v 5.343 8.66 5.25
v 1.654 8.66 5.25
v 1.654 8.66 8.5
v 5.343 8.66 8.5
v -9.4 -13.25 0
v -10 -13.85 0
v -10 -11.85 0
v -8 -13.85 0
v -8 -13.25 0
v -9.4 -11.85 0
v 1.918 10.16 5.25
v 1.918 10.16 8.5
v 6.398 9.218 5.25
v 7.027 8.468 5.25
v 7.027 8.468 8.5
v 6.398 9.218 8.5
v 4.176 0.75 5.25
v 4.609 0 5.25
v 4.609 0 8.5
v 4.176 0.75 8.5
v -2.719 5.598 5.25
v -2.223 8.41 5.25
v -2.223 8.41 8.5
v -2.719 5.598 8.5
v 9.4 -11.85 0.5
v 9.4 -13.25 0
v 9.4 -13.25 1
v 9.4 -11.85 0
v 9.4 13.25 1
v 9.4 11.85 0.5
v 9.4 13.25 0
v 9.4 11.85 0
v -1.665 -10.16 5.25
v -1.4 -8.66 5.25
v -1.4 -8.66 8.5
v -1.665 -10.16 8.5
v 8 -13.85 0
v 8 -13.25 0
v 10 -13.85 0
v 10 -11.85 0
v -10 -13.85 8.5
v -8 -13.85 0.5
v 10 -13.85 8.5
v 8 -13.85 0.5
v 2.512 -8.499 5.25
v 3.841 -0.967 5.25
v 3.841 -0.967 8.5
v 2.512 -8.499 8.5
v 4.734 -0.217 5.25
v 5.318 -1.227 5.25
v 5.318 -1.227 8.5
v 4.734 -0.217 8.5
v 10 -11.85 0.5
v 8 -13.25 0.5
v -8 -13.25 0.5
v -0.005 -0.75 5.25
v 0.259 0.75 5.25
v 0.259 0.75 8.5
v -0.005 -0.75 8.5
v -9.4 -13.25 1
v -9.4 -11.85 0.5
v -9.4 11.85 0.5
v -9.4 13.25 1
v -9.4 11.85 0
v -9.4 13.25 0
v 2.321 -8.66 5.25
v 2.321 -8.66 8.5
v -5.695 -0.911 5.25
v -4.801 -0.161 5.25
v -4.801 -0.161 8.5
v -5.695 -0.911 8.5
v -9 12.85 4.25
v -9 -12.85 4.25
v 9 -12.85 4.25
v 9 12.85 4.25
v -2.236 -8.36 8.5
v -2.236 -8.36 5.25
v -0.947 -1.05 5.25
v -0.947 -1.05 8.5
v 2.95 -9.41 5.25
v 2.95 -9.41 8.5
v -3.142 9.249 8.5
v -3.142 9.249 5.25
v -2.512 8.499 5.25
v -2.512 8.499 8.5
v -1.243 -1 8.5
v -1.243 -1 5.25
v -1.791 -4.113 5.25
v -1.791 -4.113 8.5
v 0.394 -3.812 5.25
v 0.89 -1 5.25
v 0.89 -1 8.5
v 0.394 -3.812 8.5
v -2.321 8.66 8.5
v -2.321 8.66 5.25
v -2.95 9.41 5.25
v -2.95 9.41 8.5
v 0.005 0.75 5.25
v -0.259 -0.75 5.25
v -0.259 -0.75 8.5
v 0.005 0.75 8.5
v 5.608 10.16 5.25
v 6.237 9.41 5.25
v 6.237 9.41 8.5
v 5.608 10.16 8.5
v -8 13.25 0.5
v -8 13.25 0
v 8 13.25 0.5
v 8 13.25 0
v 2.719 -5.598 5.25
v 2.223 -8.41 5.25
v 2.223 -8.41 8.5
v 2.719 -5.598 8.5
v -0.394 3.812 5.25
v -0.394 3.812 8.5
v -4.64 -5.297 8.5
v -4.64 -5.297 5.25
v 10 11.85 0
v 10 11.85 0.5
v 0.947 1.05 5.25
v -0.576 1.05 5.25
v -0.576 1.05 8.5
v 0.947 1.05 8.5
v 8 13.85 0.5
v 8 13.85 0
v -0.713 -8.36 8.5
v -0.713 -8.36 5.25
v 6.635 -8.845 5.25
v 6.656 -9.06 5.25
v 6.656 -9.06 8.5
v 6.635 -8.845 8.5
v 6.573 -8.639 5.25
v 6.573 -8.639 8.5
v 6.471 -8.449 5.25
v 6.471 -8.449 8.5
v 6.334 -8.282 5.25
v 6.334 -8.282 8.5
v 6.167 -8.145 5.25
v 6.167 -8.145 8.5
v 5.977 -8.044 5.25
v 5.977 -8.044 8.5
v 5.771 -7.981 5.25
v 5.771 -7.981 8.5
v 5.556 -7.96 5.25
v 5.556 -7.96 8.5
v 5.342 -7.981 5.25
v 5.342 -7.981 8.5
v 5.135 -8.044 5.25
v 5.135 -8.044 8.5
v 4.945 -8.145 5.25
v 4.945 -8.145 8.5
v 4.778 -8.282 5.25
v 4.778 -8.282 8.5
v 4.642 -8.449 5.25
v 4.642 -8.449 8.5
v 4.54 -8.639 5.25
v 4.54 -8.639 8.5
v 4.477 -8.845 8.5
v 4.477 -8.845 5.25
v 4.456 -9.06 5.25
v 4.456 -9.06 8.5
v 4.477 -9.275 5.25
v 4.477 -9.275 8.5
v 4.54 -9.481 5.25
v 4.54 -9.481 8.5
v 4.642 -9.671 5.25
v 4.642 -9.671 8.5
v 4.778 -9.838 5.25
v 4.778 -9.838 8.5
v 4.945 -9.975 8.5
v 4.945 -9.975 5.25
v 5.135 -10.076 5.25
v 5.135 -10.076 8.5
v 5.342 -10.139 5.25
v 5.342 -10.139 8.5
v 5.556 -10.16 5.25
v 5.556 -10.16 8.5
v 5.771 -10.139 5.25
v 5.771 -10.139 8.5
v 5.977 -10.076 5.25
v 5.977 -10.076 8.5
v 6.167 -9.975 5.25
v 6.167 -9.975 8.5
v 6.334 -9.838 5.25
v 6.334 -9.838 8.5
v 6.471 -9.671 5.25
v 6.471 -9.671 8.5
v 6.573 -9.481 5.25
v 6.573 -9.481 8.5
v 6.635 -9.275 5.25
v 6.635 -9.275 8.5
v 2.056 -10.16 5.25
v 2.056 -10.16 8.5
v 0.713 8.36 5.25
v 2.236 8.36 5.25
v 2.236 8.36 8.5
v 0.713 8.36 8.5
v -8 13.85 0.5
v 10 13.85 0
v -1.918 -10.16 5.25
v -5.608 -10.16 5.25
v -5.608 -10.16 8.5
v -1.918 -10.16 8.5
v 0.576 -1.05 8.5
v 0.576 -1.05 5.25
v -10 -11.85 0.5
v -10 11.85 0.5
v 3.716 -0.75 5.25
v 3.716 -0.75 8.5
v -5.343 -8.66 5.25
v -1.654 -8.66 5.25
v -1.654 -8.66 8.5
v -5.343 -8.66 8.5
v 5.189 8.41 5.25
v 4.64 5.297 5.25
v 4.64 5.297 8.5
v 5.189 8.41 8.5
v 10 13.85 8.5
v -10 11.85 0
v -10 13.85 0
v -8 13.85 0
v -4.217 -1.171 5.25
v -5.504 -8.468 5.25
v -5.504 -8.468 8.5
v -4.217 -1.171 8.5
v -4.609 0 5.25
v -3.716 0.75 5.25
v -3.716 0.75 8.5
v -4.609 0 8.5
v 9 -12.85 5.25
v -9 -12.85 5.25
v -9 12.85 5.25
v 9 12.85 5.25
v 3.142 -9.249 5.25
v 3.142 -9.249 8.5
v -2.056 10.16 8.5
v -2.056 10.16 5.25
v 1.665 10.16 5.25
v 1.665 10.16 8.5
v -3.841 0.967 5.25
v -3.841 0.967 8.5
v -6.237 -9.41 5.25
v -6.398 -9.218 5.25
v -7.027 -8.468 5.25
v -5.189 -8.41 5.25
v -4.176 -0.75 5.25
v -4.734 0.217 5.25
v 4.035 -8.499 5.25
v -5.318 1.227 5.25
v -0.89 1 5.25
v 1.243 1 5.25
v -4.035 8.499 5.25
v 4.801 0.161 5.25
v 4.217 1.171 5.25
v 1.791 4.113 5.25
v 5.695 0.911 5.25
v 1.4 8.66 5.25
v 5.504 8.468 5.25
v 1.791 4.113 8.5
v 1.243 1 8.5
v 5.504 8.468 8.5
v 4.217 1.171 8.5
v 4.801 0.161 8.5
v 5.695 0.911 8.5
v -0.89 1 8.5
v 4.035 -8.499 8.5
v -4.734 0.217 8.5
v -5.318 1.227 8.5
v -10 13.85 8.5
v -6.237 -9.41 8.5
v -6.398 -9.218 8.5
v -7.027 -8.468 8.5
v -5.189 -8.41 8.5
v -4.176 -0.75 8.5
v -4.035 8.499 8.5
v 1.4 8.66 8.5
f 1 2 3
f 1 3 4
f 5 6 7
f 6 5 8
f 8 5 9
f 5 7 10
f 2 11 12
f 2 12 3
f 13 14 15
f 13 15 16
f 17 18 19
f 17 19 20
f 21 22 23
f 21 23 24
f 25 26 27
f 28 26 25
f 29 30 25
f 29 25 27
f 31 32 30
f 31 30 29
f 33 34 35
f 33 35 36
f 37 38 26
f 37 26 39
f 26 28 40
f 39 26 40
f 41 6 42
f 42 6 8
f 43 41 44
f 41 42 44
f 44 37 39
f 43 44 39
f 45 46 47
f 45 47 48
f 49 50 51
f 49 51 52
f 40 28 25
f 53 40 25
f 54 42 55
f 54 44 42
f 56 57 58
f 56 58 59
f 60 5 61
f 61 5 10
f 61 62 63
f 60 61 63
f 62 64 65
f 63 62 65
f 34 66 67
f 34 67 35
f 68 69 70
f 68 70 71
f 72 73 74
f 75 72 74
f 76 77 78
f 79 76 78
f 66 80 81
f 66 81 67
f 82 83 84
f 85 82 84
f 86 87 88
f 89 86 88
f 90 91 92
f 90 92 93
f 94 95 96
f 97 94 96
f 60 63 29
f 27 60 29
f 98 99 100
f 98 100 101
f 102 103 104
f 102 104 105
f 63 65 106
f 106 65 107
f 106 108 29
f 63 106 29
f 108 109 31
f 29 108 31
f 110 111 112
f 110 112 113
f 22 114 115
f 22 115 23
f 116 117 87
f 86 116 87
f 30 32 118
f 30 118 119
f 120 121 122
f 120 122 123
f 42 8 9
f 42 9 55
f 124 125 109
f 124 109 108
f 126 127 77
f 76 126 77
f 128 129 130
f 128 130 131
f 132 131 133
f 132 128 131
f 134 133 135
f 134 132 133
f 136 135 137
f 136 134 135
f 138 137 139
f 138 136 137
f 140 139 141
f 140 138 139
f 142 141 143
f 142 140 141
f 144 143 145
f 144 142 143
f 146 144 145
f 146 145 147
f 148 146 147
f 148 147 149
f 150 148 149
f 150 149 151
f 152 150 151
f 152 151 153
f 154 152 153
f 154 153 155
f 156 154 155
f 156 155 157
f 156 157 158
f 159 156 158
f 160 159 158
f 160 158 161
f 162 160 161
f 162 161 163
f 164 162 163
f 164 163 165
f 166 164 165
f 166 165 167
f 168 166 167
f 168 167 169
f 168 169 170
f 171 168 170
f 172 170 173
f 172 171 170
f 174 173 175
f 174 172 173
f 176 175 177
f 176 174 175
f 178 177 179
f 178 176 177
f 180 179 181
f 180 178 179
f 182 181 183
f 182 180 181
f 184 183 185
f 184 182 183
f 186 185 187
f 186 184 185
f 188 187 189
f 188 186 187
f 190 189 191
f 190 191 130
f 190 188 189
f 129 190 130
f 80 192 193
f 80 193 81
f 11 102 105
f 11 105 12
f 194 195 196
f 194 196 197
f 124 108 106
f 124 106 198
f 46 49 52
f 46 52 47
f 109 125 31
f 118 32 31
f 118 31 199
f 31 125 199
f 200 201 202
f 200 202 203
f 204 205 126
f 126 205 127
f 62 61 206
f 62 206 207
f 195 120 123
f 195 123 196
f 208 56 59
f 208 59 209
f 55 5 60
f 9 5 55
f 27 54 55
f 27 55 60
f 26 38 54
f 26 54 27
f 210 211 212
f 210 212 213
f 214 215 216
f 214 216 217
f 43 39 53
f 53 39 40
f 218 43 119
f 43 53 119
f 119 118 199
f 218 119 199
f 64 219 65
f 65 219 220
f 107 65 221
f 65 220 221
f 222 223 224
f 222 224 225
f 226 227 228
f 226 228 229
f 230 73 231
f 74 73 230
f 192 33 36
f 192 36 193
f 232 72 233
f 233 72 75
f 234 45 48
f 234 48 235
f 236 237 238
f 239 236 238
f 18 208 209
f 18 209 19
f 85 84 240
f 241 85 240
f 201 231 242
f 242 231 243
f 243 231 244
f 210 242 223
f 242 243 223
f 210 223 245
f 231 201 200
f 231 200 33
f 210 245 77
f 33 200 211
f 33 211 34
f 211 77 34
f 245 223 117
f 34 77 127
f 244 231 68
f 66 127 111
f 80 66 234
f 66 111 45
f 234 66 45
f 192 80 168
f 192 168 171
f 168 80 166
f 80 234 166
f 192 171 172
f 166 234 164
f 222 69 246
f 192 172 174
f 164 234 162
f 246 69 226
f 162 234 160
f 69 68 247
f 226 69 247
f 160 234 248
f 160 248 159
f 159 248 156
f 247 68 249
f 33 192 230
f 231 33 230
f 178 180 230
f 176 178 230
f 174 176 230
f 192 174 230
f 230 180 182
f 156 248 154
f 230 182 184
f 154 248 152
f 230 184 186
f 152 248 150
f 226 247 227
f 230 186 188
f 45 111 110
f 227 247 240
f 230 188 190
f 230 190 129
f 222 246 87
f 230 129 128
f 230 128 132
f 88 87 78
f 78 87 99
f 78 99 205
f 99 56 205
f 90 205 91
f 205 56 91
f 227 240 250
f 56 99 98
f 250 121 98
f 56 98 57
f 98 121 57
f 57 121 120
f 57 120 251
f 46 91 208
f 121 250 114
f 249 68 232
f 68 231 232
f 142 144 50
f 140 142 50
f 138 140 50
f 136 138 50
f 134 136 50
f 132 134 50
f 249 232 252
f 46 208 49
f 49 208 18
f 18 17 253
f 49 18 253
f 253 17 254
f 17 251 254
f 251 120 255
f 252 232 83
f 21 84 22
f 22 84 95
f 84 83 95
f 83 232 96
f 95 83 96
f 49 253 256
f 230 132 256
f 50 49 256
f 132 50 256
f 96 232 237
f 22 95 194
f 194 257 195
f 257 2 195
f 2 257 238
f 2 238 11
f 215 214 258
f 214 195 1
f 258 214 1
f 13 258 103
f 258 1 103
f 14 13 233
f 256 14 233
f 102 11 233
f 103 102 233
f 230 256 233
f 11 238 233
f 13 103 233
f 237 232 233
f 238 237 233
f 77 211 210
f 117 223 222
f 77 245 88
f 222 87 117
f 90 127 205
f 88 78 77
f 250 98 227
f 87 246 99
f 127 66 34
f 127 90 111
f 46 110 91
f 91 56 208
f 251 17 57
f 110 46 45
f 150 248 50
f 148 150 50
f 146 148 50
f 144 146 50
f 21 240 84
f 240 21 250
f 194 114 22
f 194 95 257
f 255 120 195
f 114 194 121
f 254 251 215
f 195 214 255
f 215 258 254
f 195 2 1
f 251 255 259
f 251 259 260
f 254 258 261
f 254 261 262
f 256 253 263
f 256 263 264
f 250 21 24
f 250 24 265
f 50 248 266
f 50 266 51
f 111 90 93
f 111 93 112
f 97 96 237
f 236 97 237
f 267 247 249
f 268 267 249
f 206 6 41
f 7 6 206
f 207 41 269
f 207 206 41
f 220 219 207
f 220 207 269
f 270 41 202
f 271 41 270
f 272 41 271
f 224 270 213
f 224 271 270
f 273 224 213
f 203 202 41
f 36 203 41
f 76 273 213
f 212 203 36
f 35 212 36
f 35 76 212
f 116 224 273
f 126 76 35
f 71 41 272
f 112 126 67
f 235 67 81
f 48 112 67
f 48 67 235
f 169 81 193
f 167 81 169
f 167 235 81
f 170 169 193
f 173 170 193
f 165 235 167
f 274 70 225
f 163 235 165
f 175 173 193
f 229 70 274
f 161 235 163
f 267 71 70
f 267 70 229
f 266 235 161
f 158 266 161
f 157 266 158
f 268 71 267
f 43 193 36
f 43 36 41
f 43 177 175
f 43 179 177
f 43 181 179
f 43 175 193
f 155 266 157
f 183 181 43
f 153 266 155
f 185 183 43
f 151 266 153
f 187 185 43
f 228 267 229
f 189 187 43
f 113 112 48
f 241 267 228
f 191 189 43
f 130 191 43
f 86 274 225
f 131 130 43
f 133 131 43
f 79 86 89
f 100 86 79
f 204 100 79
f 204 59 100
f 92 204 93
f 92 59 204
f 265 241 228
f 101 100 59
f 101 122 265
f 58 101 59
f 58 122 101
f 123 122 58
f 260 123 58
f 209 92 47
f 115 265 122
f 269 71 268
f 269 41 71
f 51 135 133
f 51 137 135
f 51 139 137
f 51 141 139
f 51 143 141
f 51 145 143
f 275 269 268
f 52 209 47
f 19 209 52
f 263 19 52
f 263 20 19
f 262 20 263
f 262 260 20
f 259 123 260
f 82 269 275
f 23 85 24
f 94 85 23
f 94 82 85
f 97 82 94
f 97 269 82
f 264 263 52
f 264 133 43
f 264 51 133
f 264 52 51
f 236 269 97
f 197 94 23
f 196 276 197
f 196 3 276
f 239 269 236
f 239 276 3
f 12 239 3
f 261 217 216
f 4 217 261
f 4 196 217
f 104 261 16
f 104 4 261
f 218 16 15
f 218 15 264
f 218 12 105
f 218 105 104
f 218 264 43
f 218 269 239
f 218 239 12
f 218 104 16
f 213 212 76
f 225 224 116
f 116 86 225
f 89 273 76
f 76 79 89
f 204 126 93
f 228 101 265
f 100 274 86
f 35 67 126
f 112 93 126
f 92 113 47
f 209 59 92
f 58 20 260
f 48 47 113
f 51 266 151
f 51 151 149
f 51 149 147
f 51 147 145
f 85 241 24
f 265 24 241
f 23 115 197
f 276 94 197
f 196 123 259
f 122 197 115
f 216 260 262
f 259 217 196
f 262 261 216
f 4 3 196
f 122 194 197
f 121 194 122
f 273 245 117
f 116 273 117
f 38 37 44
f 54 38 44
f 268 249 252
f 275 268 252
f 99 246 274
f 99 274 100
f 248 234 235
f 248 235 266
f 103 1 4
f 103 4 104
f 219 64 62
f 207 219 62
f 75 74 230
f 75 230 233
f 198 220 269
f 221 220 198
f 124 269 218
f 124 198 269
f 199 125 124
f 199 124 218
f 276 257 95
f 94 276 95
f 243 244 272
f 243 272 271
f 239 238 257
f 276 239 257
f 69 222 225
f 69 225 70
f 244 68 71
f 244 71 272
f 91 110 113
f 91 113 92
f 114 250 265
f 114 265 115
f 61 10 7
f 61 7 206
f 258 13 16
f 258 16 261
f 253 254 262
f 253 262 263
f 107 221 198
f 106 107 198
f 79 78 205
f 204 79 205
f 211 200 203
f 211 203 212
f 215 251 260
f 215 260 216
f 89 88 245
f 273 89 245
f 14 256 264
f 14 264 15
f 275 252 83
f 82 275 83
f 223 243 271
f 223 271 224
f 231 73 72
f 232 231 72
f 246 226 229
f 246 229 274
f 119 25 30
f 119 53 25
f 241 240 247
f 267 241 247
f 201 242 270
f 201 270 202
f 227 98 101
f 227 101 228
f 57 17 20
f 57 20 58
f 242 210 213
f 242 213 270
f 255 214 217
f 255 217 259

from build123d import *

# Parameters (mm, degrees)
SKETCH_W             = 18
SKETCH_H             = 25.7
PAD001_DEPTH         = 1
SKETCH002_R          = 1.1
PAD002_DEPTH         = 4.25
SKETCH004_W          = 20
SKETCH004_H          = 27.7
PAD004_DEPTH         = 8.5
SKETCH005_W          = 16
SKETCH005_H          = 0.5
POCKET_DEPTH         = 13.851
POCKET_DEPTH_BACK    = 13.851
SKETCH006_W          = 23.7
SKETCH006_H          = 0.5
POCKET001_DEPTH      = 10.001
POCKET001_DEPTH_BACK = 10.001
SKETCH007_W          = 18.8
SKETCH007_H          = 26.5
POCKET002_DEPTH      = 1


with BuildPart() as body004:
    # Sketch → Pad001 (new body)
    with BuildSketch(Plane.XY):
        Rectangle(SKETCH_W, SKETCH_H)
    extrude(amount=PAD001_DEPTH)

    # Sketch002 → Pad002 (join)
    with BuildSketch(Plane.XY):
        with Locations((5.556277, -9.06)):
            Circle(SKETCH002_R)
        Polygon((1.664554, 10.16), (1.400063, 8.66), (-2.320768, 8.66), (-2.950092, 9.41), (-2.056277, 10.16), align=None)
        Polygon((1.91841, 10.16), (1.65392, 8.66), (5.343461, 8.66), (6.237276, 9.41), (5.607952, 10.16), align=None)
        Polygon((-3.141603, 9.249303), (-2.512279, 8.499303), (-3.840514, 0.966506), (-4.734329, 0.216506), (-5.317726, 1.226979), (-4.035419, 8.499303), align=None)
        Polygon((6.397973, 9.218489), (5.504158, 8.468489), (4.217444, 1.171169), (4.80084, 0.160697), (5.694655, 0.910697), (7.027298, 8.468489), align=None)
        Polygon((-3.715514, 0.75), (-4.609329, 0), (-4.176316, -0.75), (-0.259174, -0.75), (0.005317, 0.75), align=None)
        Polygon((0.259174, 0.75), (-0.005317, -0.75), (3.715514, -0.75), (4.609329, 0), (4.176316, 0.75), align=None)
        Polygon((4.734329, -0.216506), (3.840514, -0.966506), (2.512279, -8.499303), (3.141603, -9.249303), (4.035419, -8.499303), (5.317726, -1.226979), align=None)
        Polygon((-4.217444, -1.171169), (-4.80084, -0.160697), (-5.694655, -0.910697), (-7.027298, -8.468489), (-6.397973, -9.218489), (-5.504158, -8.468489), align=None)
        Polygon((-5.343461, -8.66), (-6.237276, -9.41), (-5.607952, -10.16), (-1.91841, -10.16), (-1.65392, -8.66), align=None)
        Polygon((-1.400063, -8.66), (-1.664554, -10.16), (2.056277, -10.16), (2.950092, -9.41), (2.320768, -8.66), align=None)
        Polygon((-0.946713, -1.05), (0.576427, -1.05), (-0.712524, -8.36), (-2.235664, -8.36), align=None)
        Polygon((-0.576427, 1.05), (0.946713, 1.05), (2.235664, 8.36), (0.712524, 8.36), align=None)
        Polygon((-2.223397, 8.41), (-2.719177, 5.598295), (-0.889871, 1), (-0.394092, 3.811705), align=None)
        Polygon((1.791361, 4.112606), (1.242525, 1), (4.640381, 5.297394), (5.189217, 8.41), align=None)
        Polygon((0.889871, -1), (0.394092, -3.811705), (2.223397, -8.41), (2.719177, -5.598295), align=None)
        Polygon((-1.242525, -1), (-1.791361, -4.112606), (-5.189217, -8.41), (-4.640381, -5.297394), align=None)
    extrude(amount=PAD002_DEPTH)


with BuildPart() as body004_1:
    # Body001 placement: moved
    add(body004.part.moved(Location((0, 0, 4.25))))


with BuildPart() as pkg:
    # Sketch004 → Pad004 (new body)
    with BuildSketch(Plane.XY):
        Rectangle(SKETCH004_W, SKETCH004_H)
    extrude(amount=PAD004_DEPTH)

    # Sketch005 → Pocket (cut, two sides)
    with BuildSketch(Plane.XZ) as pocket_sk:
        with Locations((0, 0.25)):
            Rectangle(SKETCH005_W, SKETCH005_H)
    extrude(amount=-POCKET_DEPTH, mode=Mode.SUBTRACT)
    extrude(pocket_sk.sketch, amount=POCKET_DEPTH_BACK, mode=Mode.SUBTRACT)

    # Sketch006 → Pocket001 (cut, two sides)
    with BuildSketch(Plane.YZ) as pocket001_sk:
        with Locations((0, 0.25)):
            Rectangle(SKETCH006_W, SKETCH006_H)
    extrude(amount=-POCKET001_DEPTH, mode=Mode.SUBTRACT)
    extrude(pocket001_sk.sketch, amount=POCKET001_DEPTH_BACK, mode=Mode.SUBTRACT)

    # Sketch007 → Pocket002 (cut)
    with BuildSketch(Plane.XY):
        Rectangle(SKETCH007_W, SKETCH007_H)
    extrude(amount=POCKET002_DEPTH, mode=Mode.SUBTRACT)

    # Cut: cut Body004
    add(body004_1.part, mode=Mode.SUBTRACT)


solid = pkg.part
